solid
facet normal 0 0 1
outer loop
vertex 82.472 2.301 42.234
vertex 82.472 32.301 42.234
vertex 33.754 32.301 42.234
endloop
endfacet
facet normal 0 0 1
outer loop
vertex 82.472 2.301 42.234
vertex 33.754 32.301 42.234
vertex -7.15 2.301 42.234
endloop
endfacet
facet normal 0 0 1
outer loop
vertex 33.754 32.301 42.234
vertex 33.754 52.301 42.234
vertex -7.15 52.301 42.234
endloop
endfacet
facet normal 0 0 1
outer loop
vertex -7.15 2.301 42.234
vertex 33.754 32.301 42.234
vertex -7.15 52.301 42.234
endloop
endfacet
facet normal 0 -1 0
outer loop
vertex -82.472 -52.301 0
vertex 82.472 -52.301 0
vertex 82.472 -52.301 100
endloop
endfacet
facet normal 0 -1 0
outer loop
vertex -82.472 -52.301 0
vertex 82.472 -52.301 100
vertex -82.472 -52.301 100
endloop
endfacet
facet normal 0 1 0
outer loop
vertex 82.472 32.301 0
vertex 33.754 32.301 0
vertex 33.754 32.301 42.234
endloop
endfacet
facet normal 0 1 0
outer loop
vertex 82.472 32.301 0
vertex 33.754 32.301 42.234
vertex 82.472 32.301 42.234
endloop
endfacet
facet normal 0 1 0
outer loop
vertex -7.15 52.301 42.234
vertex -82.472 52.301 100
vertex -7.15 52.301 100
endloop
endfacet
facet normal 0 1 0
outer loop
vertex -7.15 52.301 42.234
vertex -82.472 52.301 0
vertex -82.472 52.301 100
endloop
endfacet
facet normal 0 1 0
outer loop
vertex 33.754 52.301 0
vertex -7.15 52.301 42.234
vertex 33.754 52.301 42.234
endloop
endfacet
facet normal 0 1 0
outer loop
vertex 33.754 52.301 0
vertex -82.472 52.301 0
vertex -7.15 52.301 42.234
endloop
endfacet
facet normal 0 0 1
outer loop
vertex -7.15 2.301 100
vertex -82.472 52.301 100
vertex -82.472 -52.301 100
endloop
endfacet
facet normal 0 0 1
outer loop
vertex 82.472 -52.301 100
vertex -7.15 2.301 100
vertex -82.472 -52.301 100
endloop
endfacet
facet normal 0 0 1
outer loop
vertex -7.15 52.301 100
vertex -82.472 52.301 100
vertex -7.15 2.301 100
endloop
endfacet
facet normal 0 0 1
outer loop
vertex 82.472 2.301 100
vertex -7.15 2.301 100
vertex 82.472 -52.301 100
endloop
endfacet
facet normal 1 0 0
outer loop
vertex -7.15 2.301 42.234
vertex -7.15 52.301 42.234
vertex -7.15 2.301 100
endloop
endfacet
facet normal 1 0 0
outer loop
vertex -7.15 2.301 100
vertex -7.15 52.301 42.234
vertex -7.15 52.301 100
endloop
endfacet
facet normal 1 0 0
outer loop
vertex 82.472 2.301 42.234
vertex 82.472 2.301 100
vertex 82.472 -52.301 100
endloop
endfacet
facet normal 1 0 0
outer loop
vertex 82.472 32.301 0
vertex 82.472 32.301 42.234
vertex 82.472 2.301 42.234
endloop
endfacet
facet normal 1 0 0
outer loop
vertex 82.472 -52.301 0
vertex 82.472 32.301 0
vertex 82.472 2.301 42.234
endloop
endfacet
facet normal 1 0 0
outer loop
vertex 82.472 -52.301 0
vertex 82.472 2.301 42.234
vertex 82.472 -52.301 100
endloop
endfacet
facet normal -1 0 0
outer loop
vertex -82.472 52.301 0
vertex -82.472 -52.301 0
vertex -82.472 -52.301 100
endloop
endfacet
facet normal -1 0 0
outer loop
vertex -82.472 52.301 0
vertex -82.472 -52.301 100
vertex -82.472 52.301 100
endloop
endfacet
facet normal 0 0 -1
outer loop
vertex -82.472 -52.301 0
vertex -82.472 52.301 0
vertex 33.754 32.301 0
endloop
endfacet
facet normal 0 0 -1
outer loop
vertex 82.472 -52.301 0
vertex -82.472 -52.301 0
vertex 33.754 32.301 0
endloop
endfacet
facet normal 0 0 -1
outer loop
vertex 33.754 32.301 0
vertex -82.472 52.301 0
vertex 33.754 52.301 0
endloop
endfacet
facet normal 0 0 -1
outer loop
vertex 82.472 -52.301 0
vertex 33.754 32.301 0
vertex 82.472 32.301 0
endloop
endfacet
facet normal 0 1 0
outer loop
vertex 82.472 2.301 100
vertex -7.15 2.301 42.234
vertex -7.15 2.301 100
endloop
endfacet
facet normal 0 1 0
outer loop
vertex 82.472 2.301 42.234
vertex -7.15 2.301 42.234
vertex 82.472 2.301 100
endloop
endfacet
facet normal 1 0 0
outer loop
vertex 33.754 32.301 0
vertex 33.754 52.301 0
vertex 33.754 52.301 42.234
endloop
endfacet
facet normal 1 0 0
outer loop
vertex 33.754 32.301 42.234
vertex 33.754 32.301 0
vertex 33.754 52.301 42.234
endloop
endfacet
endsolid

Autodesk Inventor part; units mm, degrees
ref_plane "YZ Plane" through (0, 0, 0) normal (1, 0, 0) x (0, 1, 0)
ref_plane "XZ Plane" through (0, 0, 0) normal (0, 1, 0) x (-1, 0, 0)
ref_plane "XY Plane" through (0, 0, 0) normal (0, 0, 1) x (1, 0, 0)
sketch "스케치1" plane through (0, 0, 0) normal (0, 0, 1) x (1, 0, 0)
  line L0 (82.4719, -52.3014) -> (-82.4719, -52.3014)
  line L1 (-82.4719, -52.3014) -> (-82.4719, 52.3014)
  line L2 (-82.4719, 52.3014) -> (82.4719, 52.3014)
  line L3 (82.4719, 52.3014) -> (82.4719, -52.3014)
  line L4 (82.4719, -52.3014) -> (-82.4719, 52.3014) construction
  line L5 (-82.4719, -52.3014) -> (82.4719, 52.3014) construction
  point P0 (0, 0)
extrude "돌출1" add sketch "스케치1" along normal blind 100
sketch "스케치2" plane through (-82.4719, 52.3014, 0) normal (0, 1, 0) x (1, 0, 0)
  line L0 (164.9439, 0) -> (0, 0) projected
  line L1 (164.9439, 0) -> (116.2257, 0)
  line L2 (116.2257, 0) -> (116.2257, -42.2338)
  line L3 (116.2257, -42.2338) -> (164.9439, -42.2338)
  line L4 (164.9439, -42.2338) -> (164.9439, 0)
  point P0 (82.4719, 0)
extrude "돌출2" cut sketch "스케치2" against normal blind 20
sketch "스케치3" plane through (-82.4719, 52.3014, 100) normal (0, 1, 0) x (1, 0, 0)
  line L0 (164.9439, 0) -> (0, 0) projected
  line L1 (164.9439, 57.7662) -> (116.2257, 57.7662) projected
  line L2 (75.3221, 0) -> (164.9439, 0)
  line L3 (164.9439, 0) -> (164.9439, 57.7662)
  line L4 (164.9439, 57.7662) -> (75.3221, 57.7662)
  line L5 (75.3221, 57.7662) -> (75.3221, 0)
  point P0 (82.4719, 100)
extrude "돌출3" cut sketch "스케치3" against normal blind 50
properties part number "240503_3Dsketch03"
